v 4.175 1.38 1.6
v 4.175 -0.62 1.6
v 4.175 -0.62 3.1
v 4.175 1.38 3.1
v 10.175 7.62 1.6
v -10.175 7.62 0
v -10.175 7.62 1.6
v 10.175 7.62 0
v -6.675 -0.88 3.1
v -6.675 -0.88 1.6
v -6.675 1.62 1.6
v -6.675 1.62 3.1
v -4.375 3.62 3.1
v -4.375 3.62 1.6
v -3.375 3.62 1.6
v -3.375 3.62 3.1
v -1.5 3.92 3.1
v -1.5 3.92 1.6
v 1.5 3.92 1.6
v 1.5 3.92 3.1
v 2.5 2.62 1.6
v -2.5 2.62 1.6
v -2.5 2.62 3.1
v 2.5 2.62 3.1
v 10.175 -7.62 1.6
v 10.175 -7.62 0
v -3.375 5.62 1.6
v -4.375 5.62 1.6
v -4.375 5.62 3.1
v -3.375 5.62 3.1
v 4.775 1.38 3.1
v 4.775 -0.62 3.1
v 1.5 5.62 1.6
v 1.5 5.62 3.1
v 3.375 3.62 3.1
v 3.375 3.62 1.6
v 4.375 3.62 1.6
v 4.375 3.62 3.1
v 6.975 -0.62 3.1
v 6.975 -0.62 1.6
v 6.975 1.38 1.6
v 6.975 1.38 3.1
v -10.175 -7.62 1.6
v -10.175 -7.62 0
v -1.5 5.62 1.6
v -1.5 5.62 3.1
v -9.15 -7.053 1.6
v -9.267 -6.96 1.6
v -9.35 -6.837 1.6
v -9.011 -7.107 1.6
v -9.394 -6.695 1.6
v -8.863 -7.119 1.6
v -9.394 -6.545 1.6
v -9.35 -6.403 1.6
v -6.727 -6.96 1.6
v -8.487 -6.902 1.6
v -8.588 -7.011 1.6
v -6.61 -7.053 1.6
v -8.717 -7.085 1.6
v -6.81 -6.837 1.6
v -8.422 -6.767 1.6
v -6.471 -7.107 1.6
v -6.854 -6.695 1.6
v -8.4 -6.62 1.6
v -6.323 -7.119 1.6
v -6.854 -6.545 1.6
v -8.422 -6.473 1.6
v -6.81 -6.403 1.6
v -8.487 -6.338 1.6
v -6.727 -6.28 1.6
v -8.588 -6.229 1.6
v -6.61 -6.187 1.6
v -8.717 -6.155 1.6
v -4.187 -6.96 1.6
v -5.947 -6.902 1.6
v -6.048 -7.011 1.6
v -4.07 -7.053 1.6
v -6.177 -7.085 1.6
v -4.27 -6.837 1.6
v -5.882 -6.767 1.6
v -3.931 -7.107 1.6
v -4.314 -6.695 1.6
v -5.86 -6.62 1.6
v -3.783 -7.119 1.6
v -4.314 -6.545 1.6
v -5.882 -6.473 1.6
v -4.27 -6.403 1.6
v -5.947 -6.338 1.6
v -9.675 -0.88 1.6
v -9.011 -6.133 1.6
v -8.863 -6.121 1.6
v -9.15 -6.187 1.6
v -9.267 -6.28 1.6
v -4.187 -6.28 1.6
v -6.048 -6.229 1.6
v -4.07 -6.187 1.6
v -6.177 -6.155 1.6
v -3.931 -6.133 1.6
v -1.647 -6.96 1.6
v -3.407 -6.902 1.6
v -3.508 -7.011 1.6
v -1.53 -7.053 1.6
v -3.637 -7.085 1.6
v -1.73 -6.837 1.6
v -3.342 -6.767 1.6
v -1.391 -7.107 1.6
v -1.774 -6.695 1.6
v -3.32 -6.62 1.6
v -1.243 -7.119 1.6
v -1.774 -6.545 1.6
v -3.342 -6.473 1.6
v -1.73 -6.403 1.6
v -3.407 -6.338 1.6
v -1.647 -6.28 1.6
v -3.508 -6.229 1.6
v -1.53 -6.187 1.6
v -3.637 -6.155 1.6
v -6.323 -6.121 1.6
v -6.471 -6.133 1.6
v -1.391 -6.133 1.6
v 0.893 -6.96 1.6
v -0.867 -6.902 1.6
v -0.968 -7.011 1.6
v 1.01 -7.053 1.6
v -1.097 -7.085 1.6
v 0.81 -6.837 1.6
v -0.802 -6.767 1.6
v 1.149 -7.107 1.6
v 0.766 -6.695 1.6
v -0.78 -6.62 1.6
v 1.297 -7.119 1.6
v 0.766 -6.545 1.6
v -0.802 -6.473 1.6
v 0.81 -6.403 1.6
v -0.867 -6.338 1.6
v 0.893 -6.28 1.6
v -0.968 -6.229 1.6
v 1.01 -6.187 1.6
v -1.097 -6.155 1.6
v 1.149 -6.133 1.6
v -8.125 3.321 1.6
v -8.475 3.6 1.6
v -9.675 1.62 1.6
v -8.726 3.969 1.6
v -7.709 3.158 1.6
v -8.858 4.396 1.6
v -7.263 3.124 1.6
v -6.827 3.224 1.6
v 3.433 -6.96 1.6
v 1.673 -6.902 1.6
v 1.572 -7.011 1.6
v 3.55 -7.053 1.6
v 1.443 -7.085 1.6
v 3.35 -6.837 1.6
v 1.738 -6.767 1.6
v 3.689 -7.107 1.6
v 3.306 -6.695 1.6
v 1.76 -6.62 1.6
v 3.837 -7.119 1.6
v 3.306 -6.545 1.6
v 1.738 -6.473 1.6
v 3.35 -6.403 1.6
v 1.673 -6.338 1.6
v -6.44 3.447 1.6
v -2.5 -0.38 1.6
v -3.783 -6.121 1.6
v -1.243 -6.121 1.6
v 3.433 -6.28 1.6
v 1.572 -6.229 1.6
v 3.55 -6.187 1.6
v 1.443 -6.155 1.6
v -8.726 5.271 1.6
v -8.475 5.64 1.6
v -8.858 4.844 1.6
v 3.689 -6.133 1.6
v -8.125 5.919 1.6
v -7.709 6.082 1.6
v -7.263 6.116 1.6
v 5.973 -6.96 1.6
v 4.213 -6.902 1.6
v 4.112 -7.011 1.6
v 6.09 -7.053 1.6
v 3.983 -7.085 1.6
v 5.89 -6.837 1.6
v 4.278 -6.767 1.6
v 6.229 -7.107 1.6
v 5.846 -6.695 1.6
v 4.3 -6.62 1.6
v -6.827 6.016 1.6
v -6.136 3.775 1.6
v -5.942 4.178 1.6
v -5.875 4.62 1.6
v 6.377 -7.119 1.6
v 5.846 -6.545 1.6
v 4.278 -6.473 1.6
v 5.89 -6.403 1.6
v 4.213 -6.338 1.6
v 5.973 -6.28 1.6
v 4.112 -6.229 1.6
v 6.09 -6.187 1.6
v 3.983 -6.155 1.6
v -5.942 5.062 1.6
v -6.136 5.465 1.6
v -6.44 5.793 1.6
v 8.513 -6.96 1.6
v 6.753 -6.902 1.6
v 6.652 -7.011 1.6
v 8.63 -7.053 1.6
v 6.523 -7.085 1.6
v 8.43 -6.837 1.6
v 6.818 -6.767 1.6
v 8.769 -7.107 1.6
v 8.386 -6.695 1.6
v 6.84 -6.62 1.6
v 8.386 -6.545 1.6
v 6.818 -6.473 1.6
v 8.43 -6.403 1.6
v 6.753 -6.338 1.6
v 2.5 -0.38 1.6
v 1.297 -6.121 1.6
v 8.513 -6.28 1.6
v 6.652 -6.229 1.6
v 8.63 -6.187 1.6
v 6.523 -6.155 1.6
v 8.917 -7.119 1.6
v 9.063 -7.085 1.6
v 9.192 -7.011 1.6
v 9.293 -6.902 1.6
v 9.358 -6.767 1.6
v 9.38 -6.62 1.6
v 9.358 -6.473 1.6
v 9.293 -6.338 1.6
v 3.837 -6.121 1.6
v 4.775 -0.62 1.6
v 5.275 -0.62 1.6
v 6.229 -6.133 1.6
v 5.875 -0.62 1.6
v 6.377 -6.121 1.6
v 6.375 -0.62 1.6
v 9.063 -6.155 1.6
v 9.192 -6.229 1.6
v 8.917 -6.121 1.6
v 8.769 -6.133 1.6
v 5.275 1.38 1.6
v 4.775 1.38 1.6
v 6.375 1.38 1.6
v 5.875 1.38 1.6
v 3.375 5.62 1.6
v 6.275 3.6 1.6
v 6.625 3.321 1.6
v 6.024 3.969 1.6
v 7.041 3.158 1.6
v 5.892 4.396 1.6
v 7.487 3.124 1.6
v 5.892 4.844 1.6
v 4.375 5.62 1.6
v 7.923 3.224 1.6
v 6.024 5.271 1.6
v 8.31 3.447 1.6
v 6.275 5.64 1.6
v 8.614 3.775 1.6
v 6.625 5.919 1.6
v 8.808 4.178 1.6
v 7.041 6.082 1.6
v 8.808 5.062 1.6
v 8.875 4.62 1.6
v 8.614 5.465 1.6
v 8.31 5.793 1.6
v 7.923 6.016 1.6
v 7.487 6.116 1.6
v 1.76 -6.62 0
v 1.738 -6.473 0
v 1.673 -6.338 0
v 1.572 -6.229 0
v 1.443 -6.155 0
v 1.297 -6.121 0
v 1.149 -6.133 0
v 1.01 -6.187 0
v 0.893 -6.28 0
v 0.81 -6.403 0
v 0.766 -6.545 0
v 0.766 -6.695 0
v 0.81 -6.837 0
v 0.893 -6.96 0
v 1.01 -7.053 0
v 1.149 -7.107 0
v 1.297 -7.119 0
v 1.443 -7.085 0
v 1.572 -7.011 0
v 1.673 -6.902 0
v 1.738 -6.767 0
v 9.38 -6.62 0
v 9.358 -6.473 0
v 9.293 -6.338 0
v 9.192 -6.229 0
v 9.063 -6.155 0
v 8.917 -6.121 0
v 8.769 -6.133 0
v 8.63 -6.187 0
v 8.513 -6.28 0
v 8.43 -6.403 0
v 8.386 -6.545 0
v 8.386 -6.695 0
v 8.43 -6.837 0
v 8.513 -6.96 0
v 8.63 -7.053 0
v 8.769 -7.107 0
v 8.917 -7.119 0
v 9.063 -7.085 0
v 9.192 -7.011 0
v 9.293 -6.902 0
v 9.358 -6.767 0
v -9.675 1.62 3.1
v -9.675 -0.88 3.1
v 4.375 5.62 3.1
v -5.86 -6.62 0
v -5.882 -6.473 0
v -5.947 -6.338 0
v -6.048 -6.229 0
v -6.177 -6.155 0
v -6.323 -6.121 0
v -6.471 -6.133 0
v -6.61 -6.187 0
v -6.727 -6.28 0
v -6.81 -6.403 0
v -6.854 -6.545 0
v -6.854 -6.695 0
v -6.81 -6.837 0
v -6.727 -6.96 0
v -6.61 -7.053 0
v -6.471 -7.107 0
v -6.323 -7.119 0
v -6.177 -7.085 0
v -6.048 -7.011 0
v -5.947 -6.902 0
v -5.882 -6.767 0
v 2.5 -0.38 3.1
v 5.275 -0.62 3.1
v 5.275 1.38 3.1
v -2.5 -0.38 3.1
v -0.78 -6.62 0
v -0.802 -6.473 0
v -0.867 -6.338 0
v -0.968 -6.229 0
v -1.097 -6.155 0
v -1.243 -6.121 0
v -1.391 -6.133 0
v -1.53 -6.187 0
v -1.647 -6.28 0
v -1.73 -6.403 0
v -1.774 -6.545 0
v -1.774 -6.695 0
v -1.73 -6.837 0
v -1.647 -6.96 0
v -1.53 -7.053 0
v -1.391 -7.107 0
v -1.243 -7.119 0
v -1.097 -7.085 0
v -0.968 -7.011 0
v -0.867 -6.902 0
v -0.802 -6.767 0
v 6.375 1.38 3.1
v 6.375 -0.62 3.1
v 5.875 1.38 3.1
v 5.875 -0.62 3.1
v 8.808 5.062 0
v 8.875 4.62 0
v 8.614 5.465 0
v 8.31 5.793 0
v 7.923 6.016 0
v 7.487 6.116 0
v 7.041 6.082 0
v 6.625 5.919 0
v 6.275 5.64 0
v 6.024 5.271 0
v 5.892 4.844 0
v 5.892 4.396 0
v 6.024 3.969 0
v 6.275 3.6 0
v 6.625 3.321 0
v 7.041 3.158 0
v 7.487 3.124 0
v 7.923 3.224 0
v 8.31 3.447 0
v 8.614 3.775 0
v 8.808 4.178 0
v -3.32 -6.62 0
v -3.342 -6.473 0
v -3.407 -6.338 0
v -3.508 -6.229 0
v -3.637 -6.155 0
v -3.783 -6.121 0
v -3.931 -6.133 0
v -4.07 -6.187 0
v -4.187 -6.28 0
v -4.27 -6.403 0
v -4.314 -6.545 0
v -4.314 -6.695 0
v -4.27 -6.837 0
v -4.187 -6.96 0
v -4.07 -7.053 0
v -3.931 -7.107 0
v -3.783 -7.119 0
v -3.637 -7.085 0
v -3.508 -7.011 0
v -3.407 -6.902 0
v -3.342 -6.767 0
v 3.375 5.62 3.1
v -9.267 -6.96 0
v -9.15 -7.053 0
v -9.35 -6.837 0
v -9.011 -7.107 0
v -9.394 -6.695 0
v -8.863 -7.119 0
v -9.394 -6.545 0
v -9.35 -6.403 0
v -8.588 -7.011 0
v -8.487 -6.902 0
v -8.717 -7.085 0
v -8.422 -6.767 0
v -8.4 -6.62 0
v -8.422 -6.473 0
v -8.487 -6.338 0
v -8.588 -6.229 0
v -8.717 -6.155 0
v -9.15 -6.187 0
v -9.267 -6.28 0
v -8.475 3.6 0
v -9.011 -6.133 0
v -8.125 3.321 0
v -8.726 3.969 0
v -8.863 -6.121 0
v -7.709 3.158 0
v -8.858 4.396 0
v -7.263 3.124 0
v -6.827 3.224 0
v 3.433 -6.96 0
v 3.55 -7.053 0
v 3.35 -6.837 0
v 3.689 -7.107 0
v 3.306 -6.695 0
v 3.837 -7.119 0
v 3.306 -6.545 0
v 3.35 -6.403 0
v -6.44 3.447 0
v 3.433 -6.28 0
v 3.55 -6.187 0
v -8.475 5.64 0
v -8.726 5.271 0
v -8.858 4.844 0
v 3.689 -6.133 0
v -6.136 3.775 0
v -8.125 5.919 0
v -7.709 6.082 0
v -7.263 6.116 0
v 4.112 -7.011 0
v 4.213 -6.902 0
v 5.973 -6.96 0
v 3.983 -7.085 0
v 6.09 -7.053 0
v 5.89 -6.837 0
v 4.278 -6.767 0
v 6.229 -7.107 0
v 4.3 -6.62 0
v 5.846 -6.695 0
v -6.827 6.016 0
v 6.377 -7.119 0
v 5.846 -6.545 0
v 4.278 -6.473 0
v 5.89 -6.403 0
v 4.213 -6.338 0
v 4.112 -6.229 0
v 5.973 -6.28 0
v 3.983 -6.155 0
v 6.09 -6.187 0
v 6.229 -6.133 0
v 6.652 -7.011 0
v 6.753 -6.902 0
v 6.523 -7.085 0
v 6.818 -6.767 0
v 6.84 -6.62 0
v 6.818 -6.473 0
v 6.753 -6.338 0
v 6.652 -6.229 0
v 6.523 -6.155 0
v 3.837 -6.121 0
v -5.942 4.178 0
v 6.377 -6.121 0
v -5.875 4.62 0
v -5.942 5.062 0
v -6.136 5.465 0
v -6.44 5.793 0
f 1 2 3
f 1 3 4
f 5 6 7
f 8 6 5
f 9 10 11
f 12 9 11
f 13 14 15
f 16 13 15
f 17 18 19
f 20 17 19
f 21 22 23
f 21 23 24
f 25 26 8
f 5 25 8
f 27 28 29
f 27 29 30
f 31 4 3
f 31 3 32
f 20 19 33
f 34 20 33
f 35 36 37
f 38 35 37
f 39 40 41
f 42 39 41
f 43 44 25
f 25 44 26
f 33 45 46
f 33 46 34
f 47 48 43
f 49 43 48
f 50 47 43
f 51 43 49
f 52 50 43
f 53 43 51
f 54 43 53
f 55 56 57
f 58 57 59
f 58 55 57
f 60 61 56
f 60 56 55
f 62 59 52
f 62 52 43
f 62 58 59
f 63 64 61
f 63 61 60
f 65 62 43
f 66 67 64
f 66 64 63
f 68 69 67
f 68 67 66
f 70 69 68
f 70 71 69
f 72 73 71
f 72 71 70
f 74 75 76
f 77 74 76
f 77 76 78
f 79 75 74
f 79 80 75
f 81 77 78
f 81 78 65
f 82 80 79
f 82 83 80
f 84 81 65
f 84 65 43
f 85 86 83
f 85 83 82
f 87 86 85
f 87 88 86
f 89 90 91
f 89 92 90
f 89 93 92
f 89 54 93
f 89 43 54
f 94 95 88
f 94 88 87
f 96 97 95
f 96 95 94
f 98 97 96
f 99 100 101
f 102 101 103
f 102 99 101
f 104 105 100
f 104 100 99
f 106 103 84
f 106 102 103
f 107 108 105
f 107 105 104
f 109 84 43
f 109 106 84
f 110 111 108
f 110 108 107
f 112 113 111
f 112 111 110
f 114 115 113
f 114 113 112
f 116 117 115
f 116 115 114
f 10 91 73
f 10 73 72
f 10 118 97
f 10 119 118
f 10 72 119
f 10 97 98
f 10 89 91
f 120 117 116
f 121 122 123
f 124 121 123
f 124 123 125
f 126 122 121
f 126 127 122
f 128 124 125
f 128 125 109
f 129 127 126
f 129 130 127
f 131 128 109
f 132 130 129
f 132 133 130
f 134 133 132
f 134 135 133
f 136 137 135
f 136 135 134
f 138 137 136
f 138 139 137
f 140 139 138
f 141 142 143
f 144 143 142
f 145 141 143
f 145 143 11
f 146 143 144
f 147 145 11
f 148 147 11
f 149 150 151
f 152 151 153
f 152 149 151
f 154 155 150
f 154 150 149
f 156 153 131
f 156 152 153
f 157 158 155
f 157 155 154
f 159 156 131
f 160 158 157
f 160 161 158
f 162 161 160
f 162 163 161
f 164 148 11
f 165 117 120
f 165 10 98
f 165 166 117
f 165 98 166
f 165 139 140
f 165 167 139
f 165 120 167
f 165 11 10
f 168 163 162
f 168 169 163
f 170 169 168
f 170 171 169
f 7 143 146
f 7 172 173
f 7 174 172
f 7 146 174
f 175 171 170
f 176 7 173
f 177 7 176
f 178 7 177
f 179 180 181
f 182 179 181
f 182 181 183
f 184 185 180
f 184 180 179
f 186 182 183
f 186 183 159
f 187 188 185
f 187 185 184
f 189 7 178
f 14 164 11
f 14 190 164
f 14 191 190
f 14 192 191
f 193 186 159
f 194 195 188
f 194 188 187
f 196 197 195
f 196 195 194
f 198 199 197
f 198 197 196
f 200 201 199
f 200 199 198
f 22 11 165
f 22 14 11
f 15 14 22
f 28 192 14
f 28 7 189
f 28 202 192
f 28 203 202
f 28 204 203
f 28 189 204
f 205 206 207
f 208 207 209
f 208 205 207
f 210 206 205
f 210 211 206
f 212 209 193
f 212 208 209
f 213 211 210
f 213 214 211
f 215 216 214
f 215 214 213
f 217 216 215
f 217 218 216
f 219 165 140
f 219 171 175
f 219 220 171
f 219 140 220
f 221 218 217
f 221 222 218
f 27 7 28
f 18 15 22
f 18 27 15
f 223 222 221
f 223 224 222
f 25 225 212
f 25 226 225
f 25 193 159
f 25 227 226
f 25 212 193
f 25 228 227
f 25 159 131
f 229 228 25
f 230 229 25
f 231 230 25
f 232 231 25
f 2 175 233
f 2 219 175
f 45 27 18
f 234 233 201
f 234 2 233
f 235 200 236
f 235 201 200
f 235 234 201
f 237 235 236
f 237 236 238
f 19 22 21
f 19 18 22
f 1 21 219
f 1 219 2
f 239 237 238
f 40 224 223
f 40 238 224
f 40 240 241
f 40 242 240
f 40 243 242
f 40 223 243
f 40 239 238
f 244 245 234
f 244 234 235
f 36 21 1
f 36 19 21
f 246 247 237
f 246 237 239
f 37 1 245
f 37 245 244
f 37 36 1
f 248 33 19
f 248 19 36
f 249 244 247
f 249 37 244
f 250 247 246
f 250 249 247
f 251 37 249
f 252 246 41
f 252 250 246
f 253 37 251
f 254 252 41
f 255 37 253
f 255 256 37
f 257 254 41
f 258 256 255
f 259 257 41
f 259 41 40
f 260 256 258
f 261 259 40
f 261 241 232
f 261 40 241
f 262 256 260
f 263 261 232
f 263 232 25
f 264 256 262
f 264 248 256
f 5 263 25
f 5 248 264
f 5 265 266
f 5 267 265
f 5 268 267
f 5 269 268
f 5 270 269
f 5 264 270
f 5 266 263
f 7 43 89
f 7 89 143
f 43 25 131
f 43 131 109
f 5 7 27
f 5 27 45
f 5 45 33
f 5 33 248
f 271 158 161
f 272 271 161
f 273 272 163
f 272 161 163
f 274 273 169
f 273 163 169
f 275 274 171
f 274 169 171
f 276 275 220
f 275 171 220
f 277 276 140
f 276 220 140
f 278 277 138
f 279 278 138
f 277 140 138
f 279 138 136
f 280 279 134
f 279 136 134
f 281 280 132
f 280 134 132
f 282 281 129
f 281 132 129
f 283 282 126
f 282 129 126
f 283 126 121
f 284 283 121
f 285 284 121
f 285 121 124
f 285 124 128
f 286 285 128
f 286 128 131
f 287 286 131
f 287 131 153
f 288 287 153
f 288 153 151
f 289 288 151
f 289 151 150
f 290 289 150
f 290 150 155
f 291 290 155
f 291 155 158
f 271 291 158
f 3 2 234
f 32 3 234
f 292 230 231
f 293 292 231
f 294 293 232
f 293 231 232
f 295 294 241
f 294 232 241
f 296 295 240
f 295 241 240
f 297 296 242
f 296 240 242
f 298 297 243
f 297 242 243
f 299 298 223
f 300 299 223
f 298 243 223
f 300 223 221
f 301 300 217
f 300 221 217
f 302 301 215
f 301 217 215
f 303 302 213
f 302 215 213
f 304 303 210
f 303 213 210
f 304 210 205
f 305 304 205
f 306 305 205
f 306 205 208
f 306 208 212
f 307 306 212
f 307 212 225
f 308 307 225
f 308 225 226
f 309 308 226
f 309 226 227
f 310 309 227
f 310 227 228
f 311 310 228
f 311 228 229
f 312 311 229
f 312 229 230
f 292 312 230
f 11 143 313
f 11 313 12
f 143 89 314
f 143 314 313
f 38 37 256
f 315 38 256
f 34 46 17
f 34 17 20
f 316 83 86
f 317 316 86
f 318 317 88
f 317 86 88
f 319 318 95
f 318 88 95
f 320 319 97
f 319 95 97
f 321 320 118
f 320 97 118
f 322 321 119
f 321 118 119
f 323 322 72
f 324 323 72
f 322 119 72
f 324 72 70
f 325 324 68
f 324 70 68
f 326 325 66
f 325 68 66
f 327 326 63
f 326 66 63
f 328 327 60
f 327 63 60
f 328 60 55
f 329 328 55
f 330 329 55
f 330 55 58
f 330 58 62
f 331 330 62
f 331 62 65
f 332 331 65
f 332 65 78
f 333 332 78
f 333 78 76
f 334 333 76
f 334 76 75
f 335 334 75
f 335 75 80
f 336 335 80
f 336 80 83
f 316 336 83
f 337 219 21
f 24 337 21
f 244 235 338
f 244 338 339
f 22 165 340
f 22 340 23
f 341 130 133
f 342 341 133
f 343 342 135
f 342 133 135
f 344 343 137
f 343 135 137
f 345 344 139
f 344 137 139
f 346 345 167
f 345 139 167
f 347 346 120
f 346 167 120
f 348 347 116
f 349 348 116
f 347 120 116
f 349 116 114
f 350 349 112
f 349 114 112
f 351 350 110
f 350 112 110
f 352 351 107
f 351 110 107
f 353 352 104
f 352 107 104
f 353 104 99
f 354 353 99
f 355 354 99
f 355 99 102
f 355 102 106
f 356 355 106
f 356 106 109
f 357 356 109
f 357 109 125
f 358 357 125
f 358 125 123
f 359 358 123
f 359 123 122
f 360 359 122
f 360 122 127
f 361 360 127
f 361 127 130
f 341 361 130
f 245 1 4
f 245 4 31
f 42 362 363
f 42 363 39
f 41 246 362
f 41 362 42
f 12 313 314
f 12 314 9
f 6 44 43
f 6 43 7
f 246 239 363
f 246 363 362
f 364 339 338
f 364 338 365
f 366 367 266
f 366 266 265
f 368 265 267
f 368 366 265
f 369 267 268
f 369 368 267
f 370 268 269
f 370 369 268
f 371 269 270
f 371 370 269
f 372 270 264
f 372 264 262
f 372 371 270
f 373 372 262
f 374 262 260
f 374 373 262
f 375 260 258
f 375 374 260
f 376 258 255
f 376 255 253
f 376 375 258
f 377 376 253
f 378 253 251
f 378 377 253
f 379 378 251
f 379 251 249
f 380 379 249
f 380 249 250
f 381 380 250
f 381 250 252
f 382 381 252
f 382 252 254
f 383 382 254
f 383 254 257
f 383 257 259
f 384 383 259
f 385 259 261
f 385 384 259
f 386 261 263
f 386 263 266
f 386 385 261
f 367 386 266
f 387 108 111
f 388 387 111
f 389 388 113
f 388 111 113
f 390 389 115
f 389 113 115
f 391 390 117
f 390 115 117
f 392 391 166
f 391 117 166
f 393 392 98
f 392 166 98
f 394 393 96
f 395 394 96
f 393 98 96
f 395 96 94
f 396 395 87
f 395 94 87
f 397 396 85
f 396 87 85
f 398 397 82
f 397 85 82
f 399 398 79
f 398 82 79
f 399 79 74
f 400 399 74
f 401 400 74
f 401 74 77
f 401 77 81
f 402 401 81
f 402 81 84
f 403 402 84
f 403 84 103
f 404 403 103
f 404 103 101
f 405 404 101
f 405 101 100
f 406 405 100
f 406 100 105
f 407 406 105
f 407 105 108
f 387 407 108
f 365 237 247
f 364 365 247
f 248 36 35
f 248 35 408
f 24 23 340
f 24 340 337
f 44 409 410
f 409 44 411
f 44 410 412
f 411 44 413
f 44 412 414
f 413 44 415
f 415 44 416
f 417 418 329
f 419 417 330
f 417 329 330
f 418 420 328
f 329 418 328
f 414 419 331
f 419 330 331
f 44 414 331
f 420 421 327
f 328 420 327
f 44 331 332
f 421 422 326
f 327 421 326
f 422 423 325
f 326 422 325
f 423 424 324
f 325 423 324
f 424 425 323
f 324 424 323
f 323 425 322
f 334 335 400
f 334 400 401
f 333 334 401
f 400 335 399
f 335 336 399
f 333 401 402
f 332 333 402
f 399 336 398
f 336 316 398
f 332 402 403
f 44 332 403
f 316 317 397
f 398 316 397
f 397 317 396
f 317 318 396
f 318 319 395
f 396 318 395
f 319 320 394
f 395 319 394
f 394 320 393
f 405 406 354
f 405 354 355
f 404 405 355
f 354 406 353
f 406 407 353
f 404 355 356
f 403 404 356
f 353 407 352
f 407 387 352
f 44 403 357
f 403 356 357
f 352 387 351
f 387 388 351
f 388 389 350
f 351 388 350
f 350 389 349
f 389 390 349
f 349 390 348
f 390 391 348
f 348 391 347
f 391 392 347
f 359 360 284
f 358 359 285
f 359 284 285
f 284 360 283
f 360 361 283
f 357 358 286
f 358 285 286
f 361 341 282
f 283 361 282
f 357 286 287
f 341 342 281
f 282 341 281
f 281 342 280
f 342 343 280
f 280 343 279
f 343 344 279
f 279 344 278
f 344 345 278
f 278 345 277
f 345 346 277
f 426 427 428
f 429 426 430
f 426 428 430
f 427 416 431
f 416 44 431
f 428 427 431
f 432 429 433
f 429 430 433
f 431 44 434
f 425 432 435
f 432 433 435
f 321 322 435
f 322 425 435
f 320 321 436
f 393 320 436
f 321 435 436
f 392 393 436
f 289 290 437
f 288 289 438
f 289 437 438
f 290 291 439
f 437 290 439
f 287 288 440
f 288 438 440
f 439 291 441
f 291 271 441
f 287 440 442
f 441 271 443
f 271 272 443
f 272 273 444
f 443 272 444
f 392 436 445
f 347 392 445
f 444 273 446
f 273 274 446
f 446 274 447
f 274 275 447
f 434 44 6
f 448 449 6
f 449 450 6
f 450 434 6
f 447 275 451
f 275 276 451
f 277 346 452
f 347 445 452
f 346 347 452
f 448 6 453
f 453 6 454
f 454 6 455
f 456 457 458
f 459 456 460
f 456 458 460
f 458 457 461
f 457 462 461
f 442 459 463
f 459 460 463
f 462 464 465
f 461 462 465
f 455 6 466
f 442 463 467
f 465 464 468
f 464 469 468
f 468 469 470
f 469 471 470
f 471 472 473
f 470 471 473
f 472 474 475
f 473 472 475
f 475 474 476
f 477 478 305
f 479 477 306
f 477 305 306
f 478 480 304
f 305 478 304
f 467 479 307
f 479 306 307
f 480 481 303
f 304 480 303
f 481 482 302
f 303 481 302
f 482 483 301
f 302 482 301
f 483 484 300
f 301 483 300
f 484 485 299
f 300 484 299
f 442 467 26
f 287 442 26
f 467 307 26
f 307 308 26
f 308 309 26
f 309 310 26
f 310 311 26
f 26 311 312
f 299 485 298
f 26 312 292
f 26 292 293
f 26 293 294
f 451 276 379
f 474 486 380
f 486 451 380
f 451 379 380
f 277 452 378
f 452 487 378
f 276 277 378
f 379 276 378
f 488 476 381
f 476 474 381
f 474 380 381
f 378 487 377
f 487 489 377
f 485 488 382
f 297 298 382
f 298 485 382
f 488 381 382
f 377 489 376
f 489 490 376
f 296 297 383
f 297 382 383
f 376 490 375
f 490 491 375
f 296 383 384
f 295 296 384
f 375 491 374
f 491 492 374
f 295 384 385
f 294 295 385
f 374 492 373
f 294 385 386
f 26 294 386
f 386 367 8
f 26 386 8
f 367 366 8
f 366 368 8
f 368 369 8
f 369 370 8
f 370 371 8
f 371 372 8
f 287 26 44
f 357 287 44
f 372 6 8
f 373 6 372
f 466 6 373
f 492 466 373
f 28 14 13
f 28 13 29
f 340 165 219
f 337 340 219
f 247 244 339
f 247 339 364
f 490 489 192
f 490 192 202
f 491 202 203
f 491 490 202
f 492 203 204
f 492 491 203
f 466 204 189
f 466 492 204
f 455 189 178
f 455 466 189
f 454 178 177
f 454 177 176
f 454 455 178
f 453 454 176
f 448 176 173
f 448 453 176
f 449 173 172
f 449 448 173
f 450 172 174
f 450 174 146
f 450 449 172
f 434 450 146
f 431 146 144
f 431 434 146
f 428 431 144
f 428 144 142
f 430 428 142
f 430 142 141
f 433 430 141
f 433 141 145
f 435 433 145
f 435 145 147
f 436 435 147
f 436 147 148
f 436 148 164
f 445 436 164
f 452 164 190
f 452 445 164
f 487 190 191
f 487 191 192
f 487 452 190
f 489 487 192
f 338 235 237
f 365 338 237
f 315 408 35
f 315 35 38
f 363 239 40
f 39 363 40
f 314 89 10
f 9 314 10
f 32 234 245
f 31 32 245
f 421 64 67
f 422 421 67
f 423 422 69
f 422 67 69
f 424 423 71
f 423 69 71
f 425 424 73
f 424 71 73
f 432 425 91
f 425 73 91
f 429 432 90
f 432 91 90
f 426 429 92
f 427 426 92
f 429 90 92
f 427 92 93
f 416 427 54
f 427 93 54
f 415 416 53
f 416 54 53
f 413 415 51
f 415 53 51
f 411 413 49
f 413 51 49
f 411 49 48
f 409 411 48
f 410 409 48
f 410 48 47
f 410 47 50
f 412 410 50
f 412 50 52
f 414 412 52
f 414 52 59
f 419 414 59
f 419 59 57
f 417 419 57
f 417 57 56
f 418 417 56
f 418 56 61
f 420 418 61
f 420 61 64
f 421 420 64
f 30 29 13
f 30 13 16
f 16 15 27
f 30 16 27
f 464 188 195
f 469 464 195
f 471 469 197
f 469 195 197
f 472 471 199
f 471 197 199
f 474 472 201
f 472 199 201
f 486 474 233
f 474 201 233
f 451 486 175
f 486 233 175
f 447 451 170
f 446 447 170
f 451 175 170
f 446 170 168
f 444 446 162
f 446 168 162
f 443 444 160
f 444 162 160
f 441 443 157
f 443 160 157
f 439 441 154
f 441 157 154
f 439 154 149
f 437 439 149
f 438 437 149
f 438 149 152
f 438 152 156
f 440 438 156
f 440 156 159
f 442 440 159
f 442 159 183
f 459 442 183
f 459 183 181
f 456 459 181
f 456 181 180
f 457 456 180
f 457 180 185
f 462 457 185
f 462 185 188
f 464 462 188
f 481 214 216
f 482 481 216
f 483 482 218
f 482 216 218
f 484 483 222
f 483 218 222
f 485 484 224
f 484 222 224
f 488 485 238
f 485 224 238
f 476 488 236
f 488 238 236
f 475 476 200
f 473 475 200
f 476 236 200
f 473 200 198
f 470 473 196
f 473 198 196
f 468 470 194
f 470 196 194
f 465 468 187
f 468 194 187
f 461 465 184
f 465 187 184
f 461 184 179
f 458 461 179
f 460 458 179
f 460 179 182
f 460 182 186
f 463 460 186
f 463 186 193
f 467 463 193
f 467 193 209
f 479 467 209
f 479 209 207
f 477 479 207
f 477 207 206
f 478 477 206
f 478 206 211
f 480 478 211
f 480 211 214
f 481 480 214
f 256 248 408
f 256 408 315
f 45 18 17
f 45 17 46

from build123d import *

# Parameters (mm, degrees)
SKETCH1_W           = 20.35
SKETCH1_H           = 15.24
SKETCH1_R           = 1.5
BOSS_EXTRUDE1_DEPTH = 1.6
SKETCH2_W           = 5
SKETCH2_H           = 3
SKETCH2_W_2         = 3
SKETCH2_H_2         = 2.5
SKETCH2_H_3         = 1.7
SKETCH2_W_3         = 1
SKETCH2_H_4         = 2
SKETCH2_W_4         = 0.6
BOSS_EXTRUDE2_DEPTH = 1.5
SKETCH3_R           = 0.5
CUT_EXTRUDE1_DEPTH  = 2.6
LPATTERN1_COUNT     = 5
LPATTERN1_PITCH     = 2.54
LPATTERN1_COL_COUNT = 4
LPATTERN1_COL_PITCH = 2.54


with BuildPart() as part:
    # Sketch1 → Boss-Extrude1 (new body)
    with BuildSketch(Plane.XY):
        Rectangle(SKETCH1_W, SKETCH1_H)
        with Locations((-7.375, 4.62)):
            Circle(SKETCH1_R, mode=Mode.SUBTRACT)
        with Locations((7.375, 4.62)):
            Circle(SKETCH1_R, mode=Mode.SUBTRACT)
    extrude(amount=BOSS_EXTRUDE1_DEPTH)

    # Sketch2 → Boss-Extrude2 (add)
    with BuildSketch(Plane.XY.offset(1.6)):
        with Locations((0, 1.12)):
            Rectangle(SKETCH2_W, SKETCH2_H)
        with Locations((-8.175, 0.37)):
            Rectangle(SKETCH2_W_2, SKETCH2_H_2)
        with Locations((0, 4.77)):
            Rectangle(SKETCH2_W_2, SKETCH2_H_3)
        with Locations((3.875, 4.62)):
            Rectangle(SKETCH2_W_3, SKETCH2_H_4)
        with Locations((-3.875, 4.62)):
            Rectangle(SKETCH2_W_3, SKETCH2_H_4)
        with Locations((4.475, 0.38)):
            Rectangle(SKETCH2_W_4, SKETCH2_H_4)
        with Locations((5.575, 0.38)):
            Rectangle(SKETCH2_W_4, SKETCH2_H_4)
        with Locations((6.675, 0.38)):
            Rectangle(SKETCH2_W_4, SKETCH2_H_4)
    extrude(amount=BOSS_EXTRUDE2_DEPTH)

    # Sketch3 → Cut-Extrude1 (cut, through all)
    with BuildSketch(Plane.XY.offset(1.6)):
        with Locations((-1.28, -6.62)):
            Circle(SKETCH3_R)
    cut_extrude1 = extrude(amount=-CUT_EXTRUDE1_DEPTH, mode=Mode.SUBTRACT)

    # LPattern1: Cut-Extrude1 ×5
    with Locations(*[(i * LPATTERN1_PITCH, 0, 0) for i in range(1, LPATTERN1_COUNT)]):
        add(cut_extrude1, mode=Mode.SUBTRACT)

    # LPattern1 col: Cut-Extrude1 ×4
    with Locations(*[(-i * LPATTERN1_COL_PITCH, 0, 0) for i in range(1, LPATTERN1_COL_COUNT)]):
        add(cut_extrude1, mode=Mode.SUBTRACT)


solid = part.part
